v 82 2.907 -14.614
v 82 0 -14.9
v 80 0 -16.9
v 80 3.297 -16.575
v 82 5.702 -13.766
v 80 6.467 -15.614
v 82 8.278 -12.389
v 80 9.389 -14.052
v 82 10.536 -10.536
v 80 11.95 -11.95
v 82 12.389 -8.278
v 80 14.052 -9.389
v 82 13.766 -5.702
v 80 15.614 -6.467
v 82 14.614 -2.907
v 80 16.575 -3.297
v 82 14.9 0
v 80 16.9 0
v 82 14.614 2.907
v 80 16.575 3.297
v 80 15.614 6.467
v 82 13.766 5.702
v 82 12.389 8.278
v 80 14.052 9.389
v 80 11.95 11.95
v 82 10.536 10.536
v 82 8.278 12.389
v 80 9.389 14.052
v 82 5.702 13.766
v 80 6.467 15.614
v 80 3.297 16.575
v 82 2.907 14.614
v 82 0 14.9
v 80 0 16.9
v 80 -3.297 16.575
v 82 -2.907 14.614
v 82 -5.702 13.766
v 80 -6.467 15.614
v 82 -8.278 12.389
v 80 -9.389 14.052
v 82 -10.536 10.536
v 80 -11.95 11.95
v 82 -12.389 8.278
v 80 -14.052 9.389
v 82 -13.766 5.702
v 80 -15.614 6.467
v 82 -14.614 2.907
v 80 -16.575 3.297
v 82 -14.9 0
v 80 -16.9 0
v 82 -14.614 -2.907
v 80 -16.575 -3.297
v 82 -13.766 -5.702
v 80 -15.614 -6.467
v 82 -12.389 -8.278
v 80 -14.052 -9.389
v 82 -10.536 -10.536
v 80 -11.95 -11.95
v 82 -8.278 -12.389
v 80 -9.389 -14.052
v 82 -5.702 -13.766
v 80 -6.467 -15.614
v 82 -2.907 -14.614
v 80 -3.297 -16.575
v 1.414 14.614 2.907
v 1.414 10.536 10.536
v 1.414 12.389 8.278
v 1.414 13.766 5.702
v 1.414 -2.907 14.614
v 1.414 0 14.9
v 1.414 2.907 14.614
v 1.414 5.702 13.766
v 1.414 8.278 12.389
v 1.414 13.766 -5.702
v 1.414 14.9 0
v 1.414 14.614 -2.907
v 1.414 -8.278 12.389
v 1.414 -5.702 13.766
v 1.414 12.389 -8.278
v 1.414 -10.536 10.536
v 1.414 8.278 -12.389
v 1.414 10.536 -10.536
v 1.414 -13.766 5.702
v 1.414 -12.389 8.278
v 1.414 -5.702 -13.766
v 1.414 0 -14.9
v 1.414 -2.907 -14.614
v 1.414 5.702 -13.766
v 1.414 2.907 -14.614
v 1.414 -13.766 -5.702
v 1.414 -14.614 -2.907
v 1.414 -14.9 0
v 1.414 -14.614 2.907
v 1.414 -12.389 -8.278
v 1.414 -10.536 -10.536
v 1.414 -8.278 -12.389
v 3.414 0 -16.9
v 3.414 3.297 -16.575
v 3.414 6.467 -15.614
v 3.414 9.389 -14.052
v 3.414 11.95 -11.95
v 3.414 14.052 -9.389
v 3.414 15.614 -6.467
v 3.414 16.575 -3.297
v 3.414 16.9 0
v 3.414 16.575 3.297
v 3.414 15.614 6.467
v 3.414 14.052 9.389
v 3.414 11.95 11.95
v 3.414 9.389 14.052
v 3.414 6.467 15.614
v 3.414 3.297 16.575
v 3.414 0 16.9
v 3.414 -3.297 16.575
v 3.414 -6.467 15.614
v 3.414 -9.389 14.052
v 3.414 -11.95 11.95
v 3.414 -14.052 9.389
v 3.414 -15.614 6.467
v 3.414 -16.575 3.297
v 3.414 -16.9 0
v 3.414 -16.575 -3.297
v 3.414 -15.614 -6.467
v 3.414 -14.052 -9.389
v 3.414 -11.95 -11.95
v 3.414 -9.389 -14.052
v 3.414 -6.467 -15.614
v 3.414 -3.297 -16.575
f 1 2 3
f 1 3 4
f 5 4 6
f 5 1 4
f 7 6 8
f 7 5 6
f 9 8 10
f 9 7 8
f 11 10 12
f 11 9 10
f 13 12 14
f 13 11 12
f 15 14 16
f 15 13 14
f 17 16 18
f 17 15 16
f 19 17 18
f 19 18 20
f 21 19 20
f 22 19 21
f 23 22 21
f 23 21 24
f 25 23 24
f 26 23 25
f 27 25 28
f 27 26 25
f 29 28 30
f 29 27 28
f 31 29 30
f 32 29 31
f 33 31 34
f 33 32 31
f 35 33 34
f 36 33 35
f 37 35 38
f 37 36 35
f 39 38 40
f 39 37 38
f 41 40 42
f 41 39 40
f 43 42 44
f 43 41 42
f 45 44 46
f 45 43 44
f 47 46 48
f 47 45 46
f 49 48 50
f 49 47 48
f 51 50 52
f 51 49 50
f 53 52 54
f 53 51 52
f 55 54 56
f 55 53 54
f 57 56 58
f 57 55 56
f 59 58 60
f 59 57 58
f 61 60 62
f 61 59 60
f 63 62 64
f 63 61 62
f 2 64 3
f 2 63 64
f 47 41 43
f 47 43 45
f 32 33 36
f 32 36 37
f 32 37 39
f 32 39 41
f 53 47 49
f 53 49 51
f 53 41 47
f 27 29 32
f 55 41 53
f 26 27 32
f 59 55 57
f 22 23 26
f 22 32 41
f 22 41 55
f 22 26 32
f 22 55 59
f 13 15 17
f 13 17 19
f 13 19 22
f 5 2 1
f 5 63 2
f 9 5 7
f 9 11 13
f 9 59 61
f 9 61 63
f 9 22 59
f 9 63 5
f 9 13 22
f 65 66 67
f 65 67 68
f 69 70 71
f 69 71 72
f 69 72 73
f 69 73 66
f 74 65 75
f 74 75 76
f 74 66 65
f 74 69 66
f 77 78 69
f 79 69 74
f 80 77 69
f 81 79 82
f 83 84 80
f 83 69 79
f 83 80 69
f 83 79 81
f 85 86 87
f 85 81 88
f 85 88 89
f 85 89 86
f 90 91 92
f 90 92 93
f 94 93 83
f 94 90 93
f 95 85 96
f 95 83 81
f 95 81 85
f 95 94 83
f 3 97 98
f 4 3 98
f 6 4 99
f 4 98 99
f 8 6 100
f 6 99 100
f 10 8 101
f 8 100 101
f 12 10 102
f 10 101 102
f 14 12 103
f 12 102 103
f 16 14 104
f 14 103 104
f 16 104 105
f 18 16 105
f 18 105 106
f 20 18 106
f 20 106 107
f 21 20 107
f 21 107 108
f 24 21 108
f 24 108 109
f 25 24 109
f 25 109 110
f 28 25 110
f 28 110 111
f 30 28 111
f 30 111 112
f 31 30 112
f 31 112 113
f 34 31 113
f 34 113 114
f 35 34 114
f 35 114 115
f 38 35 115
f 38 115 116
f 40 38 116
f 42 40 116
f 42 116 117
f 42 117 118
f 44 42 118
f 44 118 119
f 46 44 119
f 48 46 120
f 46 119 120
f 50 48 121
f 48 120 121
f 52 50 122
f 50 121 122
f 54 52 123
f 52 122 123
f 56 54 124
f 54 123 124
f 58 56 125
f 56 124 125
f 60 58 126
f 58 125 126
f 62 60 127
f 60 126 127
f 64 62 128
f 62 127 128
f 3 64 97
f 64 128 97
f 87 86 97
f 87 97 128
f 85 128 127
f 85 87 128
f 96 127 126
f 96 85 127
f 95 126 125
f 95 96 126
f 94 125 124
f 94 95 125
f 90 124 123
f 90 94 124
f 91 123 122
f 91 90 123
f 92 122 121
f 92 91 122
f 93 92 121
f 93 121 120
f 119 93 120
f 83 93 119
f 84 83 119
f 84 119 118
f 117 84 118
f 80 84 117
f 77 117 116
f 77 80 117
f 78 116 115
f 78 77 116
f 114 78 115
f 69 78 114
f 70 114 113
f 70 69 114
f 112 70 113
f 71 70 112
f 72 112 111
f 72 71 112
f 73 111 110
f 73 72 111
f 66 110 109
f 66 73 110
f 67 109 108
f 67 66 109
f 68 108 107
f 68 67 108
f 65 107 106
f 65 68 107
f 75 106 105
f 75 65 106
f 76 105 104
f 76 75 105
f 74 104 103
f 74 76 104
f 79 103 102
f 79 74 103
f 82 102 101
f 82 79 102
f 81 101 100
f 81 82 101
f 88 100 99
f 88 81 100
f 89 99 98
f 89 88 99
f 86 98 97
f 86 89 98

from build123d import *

# Parameters (mm, degrees)
SKETCH14_R          = 16.9
BOSS_EXTRUDE1_DEPTH = 82
CHAMFER1_SIZE       = 2


with BuildPart() as part:
    # Sketch14 → Boss-Extrude1 (new body)
    with BuildSketch(Plane(origin=(0, 0, 0), x_dir=(0, 0, -1), z_dir=(1, 0, 0))):
        Circle(SKETCH14_R)
    extrude(amount=BOSS_EXTRUDE1_DEPTH)

    # Sketch16 → Cut-Revolve4 (revolve, cut)
    with BuildSketch(Plane(origin=(0, 0, 0), x_dir=(1, 0, 0), z_dir=(0, 1, 0))):
        Polygon((1.414213562, 16.9), (1.414213562, 0), (0, 0), (0, 15.485786438), align=None)
    revolve(axis=Axis((82, 0, 0), (-1, 0, 0)), mode=Mode.SUBTRACT)


with BuildPart() as body_2:
    # of the pieces the cut leaves, the one that is kept (cut_revolve4_keep)
    add(part.part.solids().sort_by_distance((82, 0, -16.9))[0])

    # Chamfer1
    chamfer1_edges = [body_2.edges().sort_by_distance(p)[0] for p in [
        (82, 0, 16.9),
        (1.414213562, 0, 16.9),
    ]]
    chamfer(chamfer1_edges, length=CHAMFER1_SIZE)


solid = body_2.part
